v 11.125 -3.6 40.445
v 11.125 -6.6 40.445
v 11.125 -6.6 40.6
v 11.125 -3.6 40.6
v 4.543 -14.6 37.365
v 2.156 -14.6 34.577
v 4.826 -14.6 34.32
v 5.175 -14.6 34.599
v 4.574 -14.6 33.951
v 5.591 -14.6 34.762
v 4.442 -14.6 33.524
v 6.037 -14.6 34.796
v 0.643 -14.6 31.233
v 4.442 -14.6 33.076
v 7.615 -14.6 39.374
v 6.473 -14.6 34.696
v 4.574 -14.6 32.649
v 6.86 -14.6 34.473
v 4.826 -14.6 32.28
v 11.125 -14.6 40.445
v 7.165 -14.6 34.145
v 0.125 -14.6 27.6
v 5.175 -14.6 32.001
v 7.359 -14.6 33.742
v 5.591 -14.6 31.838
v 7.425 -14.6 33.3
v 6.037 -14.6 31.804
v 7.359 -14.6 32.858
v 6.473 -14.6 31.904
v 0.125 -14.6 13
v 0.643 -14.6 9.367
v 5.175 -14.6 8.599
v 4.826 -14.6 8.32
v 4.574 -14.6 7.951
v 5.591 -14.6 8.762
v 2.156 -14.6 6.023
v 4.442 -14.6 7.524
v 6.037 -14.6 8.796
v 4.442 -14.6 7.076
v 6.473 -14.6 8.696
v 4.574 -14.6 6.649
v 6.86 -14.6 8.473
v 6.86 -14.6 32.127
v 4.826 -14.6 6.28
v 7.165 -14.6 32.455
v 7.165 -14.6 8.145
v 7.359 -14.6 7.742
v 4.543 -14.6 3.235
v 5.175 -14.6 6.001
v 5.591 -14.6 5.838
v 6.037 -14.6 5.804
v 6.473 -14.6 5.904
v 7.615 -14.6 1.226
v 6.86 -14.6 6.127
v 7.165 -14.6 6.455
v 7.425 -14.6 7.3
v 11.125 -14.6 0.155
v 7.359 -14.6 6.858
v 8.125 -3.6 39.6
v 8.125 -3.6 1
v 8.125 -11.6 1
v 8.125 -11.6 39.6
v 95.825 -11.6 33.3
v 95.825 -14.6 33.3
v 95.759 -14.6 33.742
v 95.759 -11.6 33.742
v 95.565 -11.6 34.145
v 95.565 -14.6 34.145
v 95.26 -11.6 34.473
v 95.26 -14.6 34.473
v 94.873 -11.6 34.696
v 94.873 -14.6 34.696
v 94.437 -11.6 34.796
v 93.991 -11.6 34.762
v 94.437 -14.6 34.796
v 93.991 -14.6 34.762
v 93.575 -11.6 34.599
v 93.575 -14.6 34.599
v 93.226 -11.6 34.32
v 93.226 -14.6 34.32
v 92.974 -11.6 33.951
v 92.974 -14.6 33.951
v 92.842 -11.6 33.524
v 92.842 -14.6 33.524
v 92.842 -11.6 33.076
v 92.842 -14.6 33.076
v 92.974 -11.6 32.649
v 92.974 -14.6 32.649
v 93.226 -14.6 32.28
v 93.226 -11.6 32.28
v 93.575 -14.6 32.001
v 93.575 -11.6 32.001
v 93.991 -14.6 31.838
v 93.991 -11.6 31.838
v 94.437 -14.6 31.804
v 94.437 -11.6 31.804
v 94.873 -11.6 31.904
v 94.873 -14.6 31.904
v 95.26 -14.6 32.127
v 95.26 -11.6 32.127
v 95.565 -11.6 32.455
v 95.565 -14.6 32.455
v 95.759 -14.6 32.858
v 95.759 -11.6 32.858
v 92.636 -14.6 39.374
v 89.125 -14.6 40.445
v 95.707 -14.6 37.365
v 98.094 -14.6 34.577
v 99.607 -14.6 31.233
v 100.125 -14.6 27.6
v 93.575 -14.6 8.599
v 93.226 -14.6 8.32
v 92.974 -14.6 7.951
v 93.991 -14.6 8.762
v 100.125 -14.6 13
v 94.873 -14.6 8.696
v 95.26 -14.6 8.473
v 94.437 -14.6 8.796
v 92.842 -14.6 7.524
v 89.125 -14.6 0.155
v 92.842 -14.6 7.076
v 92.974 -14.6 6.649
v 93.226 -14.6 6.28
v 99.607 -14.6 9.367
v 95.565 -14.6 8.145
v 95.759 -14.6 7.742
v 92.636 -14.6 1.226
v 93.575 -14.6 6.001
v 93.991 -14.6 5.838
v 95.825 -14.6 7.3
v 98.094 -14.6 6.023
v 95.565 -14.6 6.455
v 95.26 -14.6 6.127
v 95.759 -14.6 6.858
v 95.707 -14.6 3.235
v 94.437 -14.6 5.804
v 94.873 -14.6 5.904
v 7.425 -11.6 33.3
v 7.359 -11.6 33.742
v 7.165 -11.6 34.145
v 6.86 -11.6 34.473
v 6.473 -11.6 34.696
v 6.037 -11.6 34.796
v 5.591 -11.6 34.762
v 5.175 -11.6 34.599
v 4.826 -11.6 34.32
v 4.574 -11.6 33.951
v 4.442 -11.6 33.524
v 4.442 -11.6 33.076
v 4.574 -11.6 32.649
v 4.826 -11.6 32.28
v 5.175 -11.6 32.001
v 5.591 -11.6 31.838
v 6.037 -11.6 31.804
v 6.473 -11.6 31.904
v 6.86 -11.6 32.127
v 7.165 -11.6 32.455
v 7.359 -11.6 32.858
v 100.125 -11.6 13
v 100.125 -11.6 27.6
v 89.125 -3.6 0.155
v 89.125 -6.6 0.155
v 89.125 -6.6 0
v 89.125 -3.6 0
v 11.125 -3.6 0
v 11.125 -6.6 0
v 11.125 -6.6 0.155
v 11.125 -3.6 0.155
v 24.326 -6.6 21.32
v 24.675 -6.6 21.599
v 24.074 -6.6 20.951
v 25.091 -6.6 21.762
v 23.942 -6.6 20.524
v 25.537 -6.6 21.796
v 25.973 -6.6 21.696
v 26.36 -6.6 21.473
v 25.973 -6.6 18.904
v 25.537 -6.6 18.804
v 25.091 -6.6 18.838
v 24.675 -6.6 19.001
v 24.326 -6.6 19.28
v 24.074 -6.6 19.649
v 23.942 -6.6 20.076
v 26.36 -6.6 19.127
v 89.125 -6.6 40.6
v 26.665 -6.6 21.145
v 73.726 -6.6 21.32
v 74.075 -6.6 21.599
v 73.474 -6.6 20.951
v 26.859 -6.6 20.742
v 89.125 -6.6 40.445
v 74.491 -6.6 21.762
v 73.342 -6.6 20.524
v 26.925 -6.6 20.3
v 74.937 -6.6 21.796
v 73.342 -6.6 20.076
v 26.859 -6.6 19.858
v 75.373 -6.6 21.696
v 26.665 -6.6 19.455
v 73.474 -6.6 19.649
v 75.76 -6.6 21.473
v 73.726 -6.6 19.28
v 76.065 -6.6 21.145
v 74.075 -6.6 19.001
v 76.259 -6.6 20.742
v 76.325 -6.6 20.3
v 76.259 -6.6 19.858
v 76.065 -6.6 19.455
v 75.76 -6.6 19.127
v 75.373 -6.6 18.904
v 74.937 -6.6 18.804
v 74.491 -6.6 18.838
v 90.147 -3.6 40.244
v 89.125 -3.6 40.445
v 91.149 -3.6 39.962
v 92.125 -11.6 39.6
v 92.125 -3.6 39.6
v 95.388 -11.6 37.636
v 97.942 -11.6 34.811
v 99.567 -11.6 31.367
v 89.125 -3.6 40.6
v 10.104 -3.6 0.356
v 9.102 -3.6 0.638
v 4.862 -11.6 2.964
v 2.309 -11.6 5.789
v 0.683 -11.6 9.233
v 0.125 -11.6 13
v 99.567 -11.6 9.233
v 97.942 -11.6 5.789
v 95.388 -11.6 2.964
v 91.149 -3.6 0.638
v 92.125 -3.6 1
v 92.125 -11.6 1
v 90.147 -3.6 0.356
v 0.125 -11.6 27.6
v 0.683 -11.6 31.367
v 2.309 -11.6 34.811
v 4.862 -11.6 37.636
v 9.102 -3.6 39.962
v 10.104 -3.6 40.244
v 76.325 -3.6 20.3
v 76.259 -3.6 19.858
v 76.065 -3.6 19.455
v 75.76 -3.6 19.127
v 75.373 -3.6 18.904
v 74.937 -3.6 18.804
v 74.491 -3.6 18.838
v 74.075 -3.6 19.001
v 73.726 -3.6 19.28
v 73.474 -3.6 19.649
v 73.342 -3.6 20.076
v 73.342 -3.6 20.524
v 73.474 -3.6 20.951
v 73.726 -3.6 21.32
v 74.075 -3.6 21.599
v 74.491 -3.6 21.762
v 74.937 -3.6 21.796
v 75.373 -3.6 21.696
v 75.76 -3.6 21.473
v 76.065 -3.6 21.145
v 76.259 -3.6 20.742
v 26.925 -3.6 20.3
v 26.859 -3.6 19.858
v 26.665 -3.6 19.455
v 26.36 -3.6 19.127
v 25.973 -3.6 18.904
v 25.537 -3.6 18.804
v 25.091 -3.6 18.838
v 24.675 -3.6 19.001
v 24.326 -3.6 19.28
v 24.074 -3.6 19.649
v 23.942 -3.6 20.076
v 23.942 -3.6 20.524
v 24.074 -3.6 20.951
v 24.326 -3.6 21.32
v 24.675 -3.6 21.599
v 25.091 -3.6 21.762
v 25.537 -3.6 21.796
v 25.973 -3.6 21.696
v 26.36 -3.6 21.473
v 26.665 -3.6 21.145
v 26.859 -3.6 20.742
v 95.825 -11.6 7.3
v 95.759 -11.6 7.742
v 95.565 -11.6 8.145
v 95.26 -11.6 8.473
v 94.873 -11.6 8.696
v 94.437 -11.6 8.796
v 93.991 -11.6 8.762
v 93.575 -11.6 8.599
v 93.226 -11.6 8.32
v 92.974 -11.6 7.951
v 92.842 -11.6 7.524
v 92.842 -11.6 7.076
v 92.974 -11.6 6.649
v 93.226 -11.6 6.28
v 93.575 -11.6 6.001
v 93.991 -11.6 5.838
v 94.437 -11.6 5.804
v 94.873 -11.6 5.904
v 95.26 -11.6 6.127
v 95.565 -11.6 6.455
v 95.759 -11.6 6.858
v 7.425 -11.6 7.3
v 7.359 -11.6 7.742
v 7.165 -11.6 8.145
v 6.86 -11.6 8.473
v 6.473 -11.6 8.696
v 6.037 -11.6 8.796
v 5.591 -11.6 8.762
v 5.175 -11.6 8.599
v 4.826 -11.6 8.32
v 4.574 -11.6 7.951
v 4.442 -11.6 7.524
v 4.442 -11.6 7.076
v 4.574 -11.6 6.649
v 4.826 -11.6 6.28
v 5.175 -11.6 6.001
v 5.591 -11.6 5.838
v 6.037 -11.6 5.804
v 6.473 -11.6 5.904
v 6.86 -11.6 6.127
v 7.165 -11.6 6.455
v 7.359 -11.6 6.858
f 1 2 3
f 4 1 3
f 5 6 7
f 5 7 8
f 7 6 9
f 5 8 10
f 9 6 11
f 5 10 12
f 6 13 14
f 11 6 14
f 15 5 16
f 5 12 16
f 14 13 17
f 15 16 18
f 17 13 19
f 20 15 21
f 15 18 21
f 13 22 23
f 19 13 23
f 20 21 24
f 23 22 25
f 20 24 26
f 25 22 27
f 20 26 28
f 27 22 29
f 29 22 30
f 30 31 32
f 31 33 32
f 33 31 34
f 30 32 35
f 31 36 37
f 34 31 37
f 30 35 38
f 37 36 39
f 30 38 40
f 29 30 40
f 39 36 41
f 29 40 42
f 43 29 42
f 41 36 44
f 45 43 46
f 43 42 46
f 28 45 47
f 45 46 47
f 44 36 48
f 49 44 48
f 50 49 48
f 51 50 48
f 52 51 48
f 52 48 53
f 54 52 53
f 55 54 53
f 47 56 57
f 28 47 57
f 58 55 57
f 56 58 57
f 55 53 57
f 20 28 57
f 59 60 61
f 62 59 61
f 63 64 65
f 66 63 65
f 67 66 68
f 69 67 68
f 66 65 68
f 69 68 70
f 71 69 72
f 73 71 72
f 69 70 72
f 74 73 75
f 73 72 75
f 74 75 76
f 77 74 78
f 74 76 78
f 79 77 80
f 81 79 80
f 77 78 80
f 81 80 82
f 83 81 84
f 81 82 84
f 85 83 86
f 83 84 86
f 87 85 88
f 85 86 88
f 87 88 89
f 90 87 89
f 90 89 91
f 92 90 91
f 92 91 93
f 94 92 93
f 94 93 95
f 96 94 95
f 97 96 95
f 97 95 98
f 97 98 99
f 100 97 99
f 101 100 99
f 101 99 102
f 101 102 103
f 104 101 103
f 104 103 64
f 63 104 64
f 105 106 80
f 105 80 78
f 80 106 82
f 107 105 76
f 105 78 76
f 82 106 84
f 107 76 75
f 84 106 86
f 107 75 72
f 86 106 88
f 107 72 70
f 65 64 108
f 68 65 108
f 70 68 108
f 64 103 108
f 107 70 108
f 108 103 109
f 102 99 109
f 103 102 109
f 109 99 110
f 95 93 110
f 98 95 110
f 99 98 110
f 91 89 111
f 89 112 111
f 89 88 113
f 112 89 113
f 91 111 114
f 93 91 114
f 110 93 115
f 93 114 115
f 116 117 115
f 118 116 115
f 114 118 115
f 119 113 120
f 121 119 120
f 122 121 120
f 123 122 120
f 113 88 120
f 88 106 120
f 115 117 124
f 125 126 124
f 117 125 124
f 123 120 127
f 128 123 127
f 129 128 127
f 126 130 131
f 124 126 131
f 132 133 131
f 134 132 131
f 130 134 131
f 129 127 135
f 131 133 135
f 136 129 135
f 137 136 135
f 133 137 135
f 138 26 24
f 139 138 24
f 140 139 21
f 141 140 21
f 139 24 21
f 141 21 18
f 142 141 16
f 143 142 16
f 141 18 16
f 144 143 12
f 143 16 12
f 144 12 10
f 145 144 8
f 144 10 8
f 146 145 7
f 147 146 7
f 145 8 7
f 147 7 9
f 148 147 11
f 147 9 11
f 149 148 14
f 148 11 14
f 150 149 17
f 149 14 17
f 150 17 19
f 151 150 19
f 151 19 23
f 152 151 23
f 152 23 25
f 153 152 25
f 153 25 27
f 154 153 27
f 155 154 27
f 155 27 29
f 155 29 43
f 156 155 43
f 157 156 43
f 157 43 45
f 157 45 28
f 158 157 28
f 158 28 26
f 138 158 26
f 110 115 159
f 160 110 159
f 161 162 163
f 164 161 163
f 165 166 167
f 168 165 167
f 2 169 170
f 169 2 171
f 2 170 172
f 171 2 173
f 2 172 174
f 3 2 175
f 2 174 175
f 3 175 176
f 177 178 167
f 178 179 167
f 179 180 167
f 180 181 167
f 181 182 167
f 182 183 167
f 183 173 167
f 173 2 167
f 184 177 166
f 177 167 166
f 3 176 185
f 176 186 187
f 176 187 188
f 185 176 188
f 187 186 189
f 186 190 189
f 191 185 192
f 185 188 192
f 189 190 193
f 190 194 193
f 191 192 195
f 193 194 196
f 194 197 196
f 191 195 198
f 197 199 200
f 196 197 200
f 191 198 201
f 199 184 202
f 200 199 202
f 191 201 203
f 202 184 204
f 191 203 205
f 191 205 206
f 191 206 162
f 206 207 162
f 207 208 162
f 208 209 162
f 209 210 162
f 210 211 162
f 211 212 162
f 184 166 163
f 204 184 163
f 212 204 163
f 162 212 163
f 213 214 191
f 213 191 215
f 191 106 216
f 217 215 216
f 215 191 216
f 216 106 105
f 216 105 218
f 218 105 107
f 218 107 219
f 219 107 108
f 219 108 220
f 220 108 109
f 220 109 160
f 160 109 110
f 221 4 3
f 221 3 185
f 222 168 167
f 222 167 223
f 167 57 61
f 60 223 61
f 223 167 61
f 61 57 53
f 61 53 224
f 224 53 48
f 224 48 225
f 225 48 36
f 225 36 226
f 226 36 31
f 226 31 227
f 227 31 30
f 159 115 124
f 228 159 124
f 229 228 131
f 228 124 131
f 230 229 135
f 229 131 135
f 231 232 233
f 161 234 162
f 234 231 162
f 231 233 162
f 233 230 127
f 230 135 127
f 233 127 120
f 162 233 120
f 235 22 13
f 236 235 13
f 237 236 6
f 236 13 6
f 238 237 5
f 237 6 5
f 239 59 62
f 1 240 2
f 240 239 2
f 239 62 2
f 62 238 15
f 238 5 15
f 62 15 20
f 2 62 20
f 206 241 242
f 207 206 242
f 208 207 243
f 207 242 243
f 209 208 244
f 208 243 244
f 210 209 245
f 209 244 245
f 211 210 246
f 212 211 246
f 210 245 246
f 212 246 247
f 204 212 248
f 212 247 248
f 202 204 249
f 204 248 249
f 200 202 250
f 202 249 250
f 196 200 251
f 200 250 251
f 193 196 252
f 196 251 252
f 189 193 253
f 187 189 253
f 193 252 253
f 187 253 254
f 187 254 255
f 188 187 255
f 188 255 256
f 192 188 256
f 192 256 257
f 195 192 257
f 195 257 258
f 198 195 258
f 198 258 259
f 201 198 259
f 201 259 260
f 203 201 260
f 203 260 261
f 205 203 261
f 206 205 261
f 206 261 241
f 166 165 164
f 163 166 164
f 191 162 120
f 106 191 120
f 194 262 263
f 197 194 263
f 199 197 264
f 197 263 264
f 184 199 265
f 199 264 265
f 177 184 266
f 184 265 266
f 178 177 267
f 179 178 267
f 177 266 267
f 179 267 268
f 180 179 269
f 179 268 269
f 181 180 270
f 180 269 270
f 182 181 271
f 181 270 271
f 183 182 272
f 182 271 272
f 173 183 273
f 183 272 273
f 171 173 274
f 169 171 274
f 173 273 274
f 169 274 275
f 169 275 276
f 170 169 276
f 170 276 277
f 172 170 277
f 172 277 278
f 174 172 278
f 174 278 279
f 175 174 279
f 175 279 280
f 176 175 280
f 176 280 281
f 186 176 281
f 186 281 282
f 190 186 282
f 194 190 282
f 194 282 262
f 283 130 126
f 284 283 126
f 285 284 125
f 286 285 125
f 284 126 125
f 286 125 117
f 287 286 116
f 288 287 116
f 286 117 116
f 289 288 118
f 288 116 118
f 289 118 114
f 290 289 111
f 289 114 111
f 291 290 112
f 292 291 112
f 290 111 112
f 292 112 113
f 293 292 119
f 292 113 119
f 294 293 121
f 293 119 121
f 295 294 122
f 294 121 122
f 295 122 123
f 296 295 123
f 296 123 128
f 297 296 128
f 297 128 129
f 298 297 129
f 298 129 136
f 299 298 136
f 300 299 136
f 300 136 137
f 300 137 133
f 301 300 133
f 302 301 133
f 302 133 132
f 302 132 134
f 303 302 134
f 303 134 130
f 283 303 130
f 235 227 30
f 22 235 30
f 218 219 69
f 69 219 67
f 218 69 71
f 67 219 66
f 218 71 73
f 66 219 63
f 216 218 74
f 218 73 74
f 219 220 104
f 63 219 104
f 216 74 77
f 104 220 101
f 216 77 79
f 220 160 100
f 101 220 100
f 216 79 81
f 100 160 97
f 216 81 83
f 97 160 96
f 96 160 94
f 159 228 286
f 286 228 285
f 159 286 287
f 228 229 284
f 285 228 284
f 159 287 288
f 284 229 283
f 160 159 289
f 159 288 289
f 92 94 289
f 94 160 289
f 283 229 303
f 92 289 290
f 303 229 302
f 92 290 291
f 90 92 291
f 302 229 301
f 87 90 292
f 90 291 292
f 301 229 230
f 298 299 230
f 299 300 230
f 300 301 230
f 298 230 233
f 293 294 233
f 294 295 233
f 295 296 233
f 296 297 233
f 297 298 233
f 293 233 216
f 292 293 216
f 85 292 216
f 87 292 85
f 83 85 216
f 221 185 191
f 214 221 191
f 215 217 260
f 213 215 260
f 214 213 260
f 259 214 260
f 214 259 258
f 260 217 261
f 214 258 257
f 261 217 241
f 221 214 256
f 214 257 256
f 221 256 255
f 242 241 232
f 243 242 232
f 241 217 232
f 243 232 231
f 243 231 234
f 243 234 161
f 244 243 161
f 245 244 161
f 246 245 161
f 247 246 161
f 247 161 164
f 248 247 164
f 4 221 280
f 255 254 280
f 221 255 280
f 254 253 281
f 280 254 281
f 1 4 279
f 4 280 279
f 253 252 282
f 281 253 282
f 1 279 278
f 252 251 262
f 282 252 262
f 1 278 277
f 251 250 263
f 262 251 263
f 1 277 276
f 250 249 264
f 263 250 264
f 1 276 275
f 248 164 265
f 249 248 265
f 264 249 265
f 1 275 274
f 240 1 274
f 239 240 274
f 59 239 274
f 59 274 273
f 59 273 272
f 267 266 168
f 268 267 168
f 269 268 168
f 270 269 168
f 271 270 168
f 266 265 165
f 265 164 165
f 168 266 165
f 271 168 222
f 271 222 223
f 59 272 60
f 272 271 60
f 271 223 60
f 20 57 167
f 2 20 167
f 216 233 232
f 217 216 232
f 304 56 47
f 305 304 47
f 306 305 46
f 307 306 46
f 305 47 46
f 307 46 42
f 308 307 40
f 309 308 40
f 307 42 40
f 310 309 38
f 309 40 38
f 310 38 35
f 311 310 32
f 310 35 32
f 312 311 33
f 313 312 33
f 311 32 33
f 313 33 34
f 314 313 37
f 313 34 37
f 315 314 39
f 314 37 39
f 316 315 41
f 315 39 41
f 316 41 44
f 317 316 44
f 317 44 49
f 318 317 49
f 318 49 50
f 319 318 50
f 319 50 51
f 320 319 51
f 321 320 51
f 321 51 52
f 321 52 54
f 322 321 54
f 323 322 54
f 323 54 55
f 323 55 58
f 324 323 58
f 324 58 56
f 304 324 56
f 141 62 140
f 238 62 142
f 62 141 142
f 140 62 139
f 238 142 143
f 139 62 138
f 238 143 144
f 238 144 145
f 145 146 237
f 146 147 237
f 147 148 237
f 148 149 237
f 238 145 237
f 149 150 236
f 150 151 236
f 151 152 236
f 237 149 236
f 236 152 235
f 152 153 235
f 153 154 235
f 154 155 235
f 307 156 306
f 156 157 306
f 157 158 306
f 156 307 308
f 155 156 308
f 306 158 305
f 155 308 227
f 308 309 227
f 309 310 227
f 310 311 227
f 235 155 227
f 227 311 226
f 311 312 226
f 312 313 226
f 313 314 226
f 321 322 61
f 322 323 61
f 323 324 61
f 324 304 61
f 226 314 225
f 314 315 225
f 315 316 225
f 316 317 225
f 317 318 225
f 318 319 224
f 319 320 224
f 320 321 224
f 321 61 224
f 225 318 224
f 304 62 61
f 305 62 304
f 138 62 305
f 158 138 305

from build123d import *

# Parameters (mm, degrees)
BOSS_EXTRUDE1_DEPTH = 40.6
SKETCH2_R           = 1.5
CUT_EXTRUDE3_DEPTH  = 24
SKETCH5_R           = 1.5
CUT_EXTRUDE4_DEPTH  = 4


with BuildPart() as part:
    # Sketch1 → Boss-Extrude1 (new body)
    with BuildSketch(Plane.XY):
        Polygon((8.125196993, -3.6), (8.125196993, -11.6), (0.125196993, -11.6), (0.125196993, -14.6), (11.125196993, -14.6), (11.125196993, -6.6), (89.125196993, -6.6), (89.125196993, -14.6), (100.125196993, -14.6), (100.125196993, -11.6), (92.125196993, -11.6), (92.125196993, -3.6), align=None)
    extrude(amount=BOSS_EXTRUDE1_DEPTH)

    # Sketch2 → Cut-Extrude3 (cut)
    with BuildSketch(Plane.XZ.offset(14.6)):
        with BuildLine():
            Line((89.125196993, 0.154767421), (89.125196993, 0))
            Line((89.125196993, 0), (100.125196993, 0))
            Line((100.125196993, 0), (100.125196993, 13))
            ThreePointArc((100.125196993, 13), (96.999405822, 4.544232737), (89.125196993, 0.154767421))
        make_face()
        with BuildLine():
            Line((89.125196993, 40.6), (89.125196993, 40.445232579))
            ThreePointArc((89.125196993, 40.445232579), (96.999405822, 36.055767263), (100.125196993, 27.6))
            Line((100.125196993, 27.6), (100.125196993, 40.6))
            Line((100.125196993, 40.6), (89.125196993, 40.6))
        make_face()
        with BuildLine():
            Line((0.125196993, 0), (11.125196993, 0))
            Line((11.125196993, 0), (11.125196993, 0.154767421))
            ThreePointArc((11.125196993, 0.154767421), (3.250988164, 4.544232737), (0.125196993, 13))
            Line((0.125196993, 13), (0.125196993, 0))
        make_face()
        with BuildLine():
            ThreePointArc((0.125196993, 27.6), (3.250988164, 36.055767263), (11.125196993, 40.445232579))
            Line((11.125196993, 40.445232579), (11.125196993, 40.6))
            Line((11.125196993, 40.6), (0.125196993, 40.6))
            Line((0.125196993, 40.6), (0.125196993, 27.6))
        make_face()
        with Locations((94.325196993, 33.3)):
            Circle(SKETCH2_R)
        with Locations((94.325196993, 7.3)):
            Circle(SKETCH2_R)
        with Locations((5.925196993, 33.3)):
            Circle(SKETCH2_R)
        with Locations((5.925196993, 7.3)):
            Circle(SKETCH2_R)
    extrude(amount=-CUT_EXTRUDE3_DEPTH, mode=Mode.SUBTRACT)

    # Sketch5 → Cut-Extrude4 (cut)
    with BuildSketch(Plane(origin=(0, -3.6, 0), x_dir=(1, 0, 0), z_dir=(0, 1, 0))):
        with Locations((25.425196993, -20.3)):
            Circle(SKETCH5_R)
        with Locations((74.825196993, -20.3)):
            Circle(SKETCH5_R)
    extrude(amount=-CUT_EXTRUDE4_DEPTH, mode=Mode.SUBTRACT)


solid = part.part
